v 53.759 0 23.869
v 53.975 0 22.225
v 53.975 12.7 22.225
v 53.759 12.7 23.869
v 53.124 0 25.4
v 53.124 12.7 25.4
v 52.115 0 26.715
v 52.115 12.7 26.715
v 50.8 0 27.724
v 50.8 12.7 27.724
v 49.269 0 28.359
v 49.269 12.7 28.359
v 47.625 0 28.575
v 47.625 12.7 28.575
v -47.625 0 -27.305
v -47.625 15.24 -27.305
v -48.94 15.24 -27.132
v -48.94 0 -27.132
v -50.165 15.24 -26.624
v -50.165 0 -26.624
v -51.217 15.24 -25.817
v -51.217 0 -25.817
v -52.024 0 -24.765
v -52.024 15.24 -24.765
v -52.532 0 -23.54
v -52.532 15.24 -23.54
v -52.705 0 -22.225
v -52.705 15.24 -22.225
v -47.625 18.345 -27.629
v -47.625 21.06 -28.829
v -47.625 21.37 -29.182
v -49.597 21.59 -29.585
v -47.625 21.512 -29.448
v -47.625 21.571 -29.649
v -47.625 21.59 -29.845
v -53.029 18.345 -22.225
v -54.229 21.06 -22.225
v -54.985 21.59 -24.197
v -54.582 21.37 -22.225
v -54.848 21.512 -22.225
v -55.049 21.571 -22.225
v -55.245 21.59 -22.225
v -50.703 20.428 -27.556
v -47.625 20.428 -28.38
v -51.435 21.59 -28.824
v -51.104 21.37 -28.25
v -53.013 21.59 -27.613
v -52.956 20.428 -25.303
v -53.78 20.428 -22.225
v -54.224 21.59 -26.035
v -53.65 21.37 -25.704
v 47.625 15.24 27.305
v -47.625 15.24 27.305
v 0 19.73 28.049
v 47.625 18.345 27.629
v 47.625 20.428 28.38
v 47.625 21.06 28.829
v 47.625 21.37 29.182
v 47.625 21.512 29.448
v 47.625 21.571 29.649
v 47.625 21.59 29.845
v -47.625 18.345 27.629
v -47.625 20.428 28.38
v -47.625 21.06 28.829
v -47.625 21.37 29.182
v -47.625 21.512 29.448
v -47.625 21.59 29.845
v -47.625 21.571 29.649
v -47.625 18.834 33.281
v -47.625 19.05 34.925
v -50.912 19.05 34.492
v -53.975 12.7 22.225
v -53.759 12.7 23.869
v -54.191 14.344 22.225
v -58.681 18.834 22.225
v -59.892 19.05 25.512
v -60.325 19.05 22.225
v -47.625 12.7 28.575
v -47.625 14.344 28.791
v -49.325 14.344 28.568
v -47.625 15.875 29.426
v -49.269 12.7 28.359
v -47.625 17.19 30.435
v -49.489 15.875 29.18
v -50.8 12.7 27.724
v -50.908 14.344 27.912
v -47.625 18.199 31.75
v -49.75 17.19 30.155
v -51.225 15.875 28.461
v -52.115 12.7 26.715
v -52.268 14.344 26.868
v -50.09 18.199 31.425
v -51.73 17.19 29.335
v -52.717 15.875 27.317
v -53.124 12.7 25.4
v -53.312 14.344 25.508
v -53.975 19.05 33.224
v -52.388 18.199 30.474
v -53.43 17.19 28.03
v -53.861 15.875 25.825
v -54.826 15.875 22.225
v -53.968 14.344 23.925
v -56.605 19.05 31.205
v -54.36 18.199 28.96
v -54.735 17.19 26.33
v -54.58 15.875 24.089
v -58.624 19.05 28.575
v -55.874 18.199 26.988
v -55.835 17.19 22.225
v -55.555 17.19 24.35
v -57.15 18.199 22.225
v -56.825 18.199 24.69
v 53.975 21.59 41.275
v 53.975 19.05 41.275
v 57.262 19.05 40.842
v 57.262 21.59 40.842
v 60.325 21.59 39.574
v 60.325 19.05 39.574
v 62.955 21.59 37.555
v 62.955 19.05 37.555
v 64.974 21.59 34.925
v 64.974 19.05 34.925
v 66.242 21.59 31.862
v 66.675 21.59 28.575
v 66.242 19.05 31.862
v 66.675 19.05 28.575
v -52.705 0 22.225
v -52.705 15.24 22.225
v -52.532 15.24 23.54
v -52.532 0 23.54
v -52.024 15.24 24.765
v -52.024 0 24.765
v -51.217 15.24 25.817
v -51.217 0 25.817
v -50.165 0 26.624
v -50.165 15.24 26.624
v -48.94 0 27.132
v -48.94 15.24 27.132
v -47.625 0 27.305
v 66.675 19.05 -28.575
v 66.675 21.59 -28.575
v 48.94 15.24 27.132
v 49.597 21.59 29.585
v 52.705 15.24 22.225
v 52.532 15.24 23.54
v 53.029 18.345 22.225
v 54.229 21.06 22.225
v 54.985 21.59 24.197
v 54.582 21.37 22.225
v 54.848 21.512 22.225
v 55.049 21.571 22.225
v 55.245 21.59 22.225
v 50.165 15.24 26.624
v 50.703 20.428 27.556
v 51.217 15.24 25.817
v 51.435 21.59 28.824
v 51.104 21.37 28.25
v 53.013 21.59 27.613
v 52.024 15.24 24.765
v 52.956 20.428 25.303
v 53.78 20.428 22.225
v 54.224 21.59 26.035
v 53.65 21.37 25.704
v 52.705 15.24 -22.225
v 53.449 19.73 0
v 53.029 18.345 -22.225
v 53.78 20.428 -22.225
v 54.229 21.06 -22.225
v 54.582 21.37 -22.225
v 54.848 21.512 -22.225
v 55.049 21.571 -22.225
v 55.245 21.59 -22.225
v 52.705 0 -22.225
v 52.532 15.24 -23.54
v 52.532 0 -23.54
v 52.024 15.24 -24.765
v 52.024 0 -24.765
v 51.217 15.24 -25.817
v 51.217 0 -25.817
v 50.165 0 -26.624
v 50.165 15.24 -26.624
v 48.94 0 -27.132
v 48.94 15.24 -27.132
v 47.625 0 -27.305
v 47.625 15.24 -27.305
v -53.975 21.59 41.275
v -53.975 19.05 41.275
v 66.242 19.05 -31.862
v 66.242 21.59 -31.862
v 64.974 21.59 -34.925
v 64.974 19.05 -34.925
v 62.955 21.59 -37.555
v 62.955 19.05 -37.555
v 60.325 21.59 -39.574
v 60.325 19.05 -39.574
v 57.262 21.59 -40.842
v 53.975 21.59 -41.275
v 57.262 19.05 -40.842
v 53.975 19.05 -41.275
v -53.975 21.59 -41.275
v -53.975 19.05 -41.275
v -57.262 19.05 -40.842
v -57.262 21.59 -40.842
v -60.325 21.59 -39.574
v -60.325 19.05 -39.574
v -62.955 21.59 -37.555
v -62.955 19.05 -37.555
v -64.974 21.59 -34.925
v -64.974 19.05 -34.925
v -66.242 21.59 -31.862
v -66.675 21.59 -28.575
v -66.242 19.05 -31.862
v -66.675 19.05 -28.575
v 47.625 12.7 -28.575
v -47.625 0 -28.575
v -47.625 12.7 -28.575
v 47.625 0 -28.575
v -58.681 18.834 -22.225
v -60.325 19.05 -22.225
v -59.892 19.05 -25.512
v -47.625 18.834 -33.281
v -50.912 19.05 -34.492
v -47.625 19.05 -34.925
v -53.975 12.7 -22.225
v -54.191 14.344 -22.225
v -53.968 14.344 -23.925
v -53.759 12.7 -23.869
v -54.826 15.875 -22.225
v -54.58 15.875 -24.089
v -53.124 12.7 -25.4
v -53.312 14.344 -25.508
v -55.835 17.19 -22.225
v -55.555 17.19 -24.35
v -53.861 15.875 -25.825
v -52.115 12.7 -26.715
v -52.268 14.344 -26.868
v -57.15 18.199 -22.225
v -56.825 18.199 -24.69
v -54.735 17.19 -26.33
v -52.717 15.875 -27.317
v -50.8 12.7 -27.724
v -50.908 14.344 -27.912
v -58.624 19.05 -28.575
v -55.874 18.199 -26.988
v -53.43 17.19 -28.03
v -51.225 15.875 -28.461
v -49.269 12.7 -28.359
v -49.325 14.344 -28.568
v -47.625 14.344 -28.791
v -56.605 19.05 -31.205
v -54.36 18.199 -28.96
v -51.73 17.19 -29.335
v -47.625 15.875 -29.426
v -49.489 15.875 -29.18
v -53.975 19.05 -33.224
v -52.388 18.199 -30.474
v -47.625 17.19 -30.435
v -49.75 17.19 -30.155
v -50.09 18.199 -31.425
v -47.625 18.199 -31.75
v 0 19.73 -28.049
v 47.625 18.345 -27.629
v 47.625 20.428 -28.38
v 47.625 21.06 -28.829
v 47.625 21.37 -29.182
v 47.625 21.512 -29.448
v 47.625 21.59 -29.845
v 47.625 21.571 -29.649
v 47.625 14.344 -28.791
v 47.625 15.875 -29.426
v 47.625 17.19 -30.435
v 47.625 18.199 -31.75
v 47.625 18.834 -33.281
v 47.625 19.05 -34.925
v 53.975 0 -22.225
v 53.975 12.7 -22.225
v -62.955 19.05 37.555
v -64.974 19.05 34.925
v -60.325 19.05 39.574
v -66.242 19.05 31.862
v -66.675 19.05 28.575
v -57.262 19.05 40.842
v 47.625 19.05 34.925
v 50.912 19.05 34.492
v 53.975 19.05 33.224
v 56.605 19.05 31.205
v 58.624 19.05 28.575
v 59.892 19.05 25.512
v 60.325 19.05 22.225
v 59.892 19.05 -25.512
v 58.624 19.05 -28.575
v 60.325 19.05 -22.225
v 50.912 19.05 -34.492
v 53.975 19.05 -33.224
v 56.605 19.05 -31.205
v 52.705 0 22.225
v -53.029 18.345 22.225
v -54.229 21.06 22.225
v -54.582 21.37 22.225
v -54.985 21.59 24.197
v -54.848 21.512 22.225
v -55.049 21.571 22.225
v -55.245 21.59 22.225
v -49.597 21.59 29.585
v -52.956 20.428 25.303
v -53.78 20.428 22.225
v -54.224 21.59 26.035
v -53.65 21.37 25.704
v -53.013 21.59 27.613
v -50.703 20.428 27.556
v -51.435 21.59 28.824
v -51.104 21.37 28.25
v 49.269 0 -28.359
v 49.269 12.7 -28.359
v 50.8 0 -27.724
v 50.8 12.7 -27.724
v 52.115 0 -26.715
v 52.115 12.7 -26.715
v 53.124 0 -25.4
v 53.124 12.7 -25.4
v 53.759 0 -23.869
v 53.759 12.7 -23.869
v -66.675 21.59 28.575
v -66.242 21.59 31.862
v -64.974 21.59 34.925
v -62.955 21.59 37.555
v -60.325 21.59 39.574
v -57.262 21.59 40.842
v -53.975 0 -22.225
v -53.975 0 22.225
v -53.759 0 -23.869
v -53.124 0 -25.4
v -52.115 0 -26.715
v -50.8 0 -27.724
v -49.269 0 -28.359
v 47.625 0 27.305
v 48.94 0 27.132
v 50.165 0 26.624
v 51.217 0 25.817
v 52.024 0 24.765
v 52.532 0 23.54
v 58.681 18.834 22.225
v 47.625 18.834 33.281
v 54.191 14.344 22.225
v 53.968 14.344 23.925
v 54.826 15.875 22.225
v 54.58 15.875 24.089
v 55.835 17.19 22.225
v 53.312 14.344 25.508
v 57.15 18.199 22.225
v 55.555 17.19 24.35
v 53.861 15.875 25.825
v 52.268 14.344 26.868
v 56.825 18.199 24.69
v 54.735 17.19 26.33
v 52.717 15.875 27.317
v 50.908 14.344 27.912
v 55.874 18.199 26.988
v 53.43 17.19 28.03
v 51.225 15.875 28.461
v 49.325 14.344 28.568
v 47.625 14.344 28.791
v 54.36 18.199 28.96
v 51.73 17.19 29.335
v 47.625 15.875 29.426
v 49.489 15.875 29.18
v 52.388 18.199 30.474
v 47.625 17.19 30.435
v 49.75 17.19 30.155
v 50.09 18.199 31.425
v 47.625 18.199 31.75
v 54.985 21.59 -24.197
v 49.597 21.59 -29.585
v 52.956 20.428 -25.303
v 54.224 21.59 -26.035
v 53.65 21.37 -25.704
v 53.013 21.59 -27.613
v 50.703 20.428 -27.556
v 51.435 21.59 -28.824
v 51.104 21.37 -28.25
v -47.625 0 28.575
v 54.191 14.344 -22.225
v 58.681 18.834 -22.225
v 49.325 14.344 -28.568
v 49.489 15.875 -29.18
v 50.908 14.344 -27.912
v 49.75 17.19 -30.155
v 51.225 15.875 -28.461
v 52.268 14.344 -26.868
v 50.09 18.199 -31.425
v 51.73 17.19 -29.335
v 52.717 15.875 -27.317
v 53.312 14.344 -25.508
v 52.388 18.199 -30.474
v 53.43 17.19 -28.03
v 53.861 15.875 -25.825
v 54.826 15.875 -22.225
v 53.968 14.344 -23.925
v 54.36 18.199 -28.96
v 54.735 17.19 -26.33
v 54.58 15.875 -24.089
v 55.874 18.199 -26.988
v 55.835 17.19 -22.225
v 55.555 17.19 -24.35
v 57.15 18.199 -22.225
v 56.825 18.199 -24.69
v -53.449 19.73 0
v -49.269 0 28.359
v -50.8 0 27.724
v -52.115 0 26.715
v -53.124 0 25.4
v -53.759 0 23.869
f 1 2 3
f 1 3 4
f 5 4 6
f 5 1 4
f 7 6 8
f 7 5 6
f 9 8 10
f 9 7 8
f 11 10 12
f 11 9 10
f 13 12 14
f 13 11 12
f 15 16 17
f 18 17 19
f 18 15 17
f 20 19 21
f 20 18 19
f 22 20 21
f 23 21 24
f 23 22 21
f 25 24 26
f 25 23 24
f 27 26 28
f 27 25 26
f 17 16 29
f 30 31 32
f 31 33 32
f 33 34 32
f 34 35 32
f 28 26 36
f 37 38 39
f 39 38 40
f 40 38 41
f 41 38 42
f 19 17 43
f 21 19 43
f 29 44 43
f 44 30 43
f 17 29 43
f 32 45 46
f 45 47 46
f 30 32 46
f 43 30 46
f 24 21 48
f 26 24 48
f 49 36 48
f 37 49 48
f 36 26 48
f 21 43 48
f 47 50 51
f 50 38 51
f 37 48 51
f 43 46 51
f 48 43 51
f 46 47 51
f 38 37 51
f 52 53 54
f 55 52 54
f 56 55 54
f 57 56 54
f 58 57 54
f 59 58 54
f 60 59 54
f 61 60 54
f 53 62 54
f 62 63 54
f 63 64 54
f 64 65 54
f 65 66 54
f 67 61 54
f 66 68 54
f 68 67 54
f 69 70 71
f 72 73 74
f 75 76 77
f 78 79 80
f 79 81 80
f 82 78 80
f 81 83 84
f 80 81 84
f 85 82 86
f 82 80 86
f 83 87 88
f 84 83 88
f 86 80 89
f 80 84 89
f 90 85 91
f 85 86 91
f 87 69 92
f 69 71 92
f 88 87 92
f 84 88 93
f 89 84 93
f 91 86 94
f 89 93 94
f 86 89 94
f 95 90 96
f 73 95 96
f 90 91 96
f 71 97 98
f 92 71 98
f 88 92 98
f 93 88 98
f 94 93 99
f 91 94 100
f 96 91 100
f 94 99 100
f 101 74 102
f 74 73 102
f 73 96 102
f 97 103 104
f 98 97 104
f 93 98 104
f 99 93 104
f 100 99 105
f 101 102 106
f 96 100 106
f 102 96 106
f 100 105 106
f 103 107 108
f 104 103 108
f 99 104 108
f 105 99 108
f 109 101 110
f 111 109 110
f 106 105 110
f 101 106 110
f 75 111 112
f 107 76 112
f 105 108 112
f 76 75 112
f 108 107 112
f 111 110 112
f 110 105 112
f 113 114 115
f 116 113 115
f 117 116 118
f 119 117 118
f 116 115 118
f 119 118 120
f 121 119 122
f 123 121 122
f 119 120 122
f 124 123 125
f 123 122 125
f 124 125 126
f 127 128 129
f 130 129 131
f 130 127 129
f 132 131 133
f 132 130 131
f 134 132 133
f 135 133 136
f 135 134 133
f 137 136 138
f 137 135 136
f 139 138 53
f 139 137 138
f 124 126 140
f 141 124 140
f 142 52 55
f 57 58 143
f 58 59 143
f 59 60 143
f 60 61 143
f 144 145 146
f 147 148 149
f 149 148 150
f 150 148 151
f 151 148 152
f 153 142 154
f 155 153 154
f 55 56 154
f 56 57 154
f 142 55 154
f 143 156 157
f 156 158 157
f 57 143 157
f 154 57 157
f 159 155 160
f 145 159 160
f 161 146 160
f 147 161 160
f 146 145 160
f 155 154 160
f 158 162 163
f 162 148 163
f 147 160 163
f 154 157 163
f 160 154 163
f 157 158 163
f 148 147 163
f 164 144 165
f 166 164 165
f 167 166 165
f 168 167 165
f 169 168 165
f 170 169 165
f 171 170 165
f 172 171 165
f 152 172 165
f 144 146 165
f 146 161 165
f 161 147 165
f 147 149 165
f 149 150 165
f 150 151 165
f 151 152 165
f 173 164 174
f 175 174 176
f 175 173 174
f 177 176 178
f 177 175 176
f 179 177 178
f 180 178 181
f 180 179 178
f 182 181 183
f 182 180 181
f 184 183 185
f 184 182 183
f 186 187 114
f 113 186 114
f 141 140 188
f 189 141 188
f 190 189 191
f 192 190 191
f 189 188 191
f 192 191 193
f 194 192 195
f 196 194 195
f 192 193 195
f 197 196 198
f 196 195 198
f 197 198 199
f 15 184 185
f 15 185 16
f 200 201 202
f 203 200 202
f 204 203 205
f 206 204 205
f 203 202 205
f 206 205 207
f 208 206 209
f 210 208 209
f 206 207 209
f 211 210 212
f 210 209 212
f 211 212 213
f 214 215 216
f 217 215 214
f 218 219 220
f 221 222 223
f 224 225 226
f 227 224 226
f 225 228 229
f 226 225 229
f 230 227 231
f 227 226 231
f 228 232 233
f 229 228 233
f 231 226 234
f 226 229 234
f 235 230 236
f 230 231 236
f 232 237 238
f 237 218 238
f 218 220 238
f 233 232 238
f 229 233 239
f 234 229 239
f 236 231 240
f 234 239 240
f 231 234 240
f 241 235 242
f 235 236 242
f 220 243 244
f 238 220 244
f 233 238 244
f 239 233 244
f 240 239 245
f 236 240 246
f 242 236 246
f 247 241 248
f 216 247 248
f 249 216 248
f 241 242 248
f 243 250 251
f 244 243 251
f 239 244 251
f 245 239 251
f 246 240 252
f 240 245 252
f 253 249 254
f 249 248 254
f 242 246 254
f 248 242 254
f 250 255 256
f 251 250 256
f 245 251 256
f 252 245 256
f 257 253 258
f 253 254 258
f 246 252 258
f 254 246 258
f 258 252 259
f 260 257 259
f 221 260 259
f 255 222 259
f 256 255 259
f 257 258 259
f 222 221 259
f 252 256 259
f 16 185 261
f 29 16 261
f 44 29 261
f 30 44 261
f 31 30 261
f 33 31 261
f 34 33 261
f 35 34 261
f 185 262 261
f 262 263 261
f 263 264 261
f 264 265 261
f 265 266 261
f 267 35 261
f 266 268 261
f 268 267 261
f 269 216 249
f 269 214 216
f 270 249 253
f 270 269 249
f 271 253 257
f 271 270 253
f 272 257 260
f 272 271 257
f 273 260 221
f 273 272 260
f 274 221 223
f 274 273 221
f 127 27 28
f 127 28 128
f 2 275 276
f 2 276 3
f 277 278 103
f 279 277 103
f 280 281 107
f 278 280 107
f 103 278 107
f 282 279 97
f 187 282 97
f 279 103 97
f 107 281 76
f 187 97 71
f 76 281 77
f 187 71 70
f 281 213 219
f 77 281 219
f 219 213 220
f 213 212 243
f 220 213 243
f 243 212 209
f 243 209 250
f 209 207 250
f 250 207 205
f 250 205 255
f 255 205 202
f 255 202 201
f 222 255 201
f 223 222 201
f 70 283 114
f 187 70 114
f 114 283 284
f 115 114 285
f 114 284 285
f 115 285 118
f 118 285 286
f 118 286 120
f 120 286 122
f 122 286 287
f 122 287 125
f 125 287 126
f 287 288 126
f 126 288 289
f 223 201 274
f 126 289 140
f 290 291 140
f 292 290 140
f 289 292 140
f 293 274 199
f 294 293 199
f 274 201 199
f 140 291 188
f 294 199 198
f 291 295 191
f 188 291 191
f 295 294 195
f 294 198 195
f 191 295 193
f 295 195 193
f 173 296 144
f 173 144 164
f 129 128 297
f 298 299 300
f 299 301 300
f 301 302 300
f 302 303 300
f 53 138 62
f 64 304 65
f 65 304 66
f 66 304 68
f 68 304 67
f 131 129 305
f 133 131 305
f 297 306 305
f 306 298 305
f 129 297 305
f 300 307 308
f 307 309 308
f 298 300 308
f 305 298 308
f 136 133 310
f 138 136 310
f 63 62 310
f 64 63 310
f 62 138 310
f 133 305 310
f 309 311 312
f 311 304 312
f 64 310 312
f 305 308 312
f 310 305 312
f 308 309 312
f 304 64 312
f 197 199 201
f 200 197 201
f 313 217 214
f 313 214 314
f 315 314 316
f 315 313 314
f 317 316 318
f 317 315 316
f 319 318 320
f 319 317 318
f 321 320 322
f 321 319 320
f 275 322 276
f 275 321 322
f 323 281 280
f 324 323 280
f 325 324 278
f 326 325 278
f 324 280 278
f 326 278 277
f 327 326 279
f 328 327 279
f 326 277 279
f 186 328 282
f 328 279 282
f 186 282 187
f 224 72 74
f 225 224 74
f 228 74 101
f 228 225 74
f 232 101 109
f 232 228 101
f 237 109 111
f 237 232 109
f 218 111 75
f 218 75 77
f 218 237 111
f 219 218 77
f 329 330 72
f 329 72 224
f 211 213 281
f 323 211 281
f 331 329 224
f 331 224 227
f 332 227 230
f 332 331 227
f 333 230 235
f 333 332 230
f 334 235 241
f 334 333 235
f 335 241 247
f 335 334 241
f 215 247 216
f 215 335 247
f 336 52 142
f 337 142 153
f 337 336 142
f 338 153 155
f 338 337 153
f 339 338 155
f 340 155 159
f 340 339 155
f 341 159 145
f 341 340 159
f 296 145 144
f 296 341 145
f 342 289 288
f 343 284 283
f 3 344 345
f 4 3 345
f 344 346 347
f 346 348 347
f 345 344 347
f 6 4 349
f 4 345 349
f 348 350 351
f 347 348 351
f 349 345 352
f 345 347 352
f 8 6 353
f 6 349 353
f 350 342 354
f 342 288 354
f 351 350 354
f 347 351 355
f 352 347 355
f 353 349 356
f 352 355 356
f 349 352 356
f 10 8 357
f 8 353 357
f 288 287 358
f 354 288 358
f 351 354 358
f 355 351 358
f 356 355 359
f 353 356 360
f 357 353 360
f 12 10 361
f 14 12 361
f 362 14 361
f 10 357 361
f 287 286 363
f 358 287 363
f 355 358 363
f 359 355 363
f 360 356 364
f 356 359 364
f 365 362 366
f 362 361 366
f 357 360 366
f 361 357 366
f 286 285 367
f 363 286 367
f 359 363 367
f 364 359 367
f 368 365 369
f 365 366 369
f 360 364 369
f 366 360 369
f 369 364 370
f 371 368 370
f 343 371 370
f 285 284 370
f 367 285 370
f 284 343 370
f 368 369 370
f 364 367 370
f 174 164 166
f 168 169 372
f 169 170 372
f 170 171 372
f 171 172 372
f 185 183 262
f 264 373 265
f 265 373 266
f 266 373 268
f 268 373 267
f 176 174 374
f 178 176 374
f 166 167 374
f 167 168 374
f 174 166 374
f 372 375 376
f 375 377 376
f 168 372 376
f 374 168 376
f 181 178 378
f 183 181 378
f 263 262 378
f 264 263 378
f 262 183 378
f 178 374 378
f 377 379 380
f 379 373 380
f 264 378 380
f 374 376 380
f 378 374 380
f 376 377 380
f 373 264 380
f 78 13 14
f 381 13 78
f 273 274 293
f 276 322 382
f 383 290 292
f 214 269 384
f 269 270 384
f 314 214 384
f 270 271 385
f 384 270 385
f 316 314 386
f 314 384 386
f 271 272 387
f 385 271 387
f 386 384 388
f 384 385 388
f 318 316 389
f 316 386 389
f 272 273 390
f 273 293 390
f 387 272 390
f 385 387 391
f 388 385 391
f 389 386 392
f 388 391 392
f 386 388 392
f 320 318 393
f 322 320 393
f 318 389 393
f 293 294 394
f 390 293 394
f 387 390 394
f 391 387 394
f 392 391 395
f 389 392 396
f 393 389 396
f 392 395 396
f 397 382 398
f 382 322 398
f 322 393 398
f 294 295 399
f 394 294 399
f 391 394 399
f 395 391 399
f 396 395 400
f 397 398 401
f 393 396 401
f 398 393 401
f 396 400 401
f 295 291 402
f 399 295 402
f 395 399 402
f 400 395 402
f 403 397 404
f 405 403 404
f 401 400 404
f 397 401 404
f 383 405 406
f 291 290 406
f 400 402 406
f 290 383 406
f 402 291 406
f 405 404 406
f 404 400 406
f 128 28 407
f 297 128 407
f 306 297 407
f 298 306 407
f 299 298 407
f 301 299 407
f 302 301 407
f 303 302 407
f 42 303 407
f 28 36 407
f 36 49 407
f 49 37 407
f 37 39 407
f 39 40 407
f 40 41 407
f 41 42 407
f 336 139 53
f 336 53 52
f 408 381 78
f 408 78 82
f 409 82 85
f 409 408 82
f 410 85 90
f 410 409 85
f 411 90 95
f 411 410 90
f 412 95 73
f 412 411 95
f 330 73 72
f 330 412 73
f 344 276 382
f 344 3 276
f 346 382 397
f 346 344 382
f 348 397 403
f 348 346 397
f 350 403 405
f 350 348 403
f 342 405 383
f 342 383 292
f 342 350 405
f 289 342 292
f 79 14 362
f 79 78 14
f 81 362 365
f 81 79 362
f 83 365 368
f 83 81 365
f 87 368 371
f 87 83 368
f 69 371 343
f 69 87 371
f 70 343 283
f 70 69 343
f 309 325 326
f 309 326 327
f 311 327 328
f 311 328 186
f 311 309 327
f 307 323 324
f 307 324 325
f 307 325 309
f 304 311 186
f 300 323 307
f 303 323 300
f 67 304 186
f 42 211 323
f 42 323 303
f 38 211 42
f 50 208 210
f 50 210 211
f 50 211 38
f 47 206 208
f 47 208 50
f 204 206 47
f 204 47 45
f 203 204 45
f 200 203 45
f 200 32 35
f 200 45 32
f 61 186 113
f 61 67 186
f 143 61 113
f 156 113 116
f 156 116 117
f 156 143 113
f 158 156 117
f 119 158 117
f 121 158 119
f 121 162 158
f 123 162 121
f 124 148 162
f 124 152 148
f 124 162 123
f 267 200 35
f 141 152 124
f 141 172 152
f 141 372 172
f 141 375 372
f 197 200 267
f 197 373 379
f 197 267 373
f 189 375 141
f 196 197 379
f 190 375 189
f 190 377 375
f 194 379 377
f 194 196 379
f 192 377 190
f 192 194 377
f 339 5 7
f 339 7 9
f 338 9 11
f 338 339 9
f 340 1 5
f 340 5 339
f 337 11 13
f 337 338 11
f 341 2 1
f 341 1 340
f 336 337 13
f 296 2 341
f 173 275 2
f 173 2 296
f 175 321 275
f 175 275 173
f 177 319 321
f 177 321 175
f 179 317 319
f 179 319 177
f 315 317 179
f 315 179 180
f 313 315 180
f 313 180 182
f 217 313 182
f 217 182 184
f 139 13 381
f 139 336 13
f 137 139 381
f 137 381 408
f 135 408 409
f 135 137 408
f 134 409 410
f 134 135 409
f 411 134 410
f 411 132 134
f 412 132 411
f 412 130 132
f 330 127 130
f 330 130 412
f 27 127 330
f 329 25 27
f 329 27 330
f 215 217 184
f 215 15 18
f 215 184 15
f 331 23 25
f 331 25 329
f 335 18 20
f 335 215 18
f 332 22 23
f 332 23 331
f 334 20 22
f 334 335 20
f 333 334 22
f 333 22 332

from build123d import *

# Parameters (mm, degrees)
BOSS_EXTRUDE1_DEPTH = 19.05
BOSS_EXTRUDE2_DEPTH = 2.54
FILLET1_R           = 6.35
FILLET3_SIZE        = 6.35
FILLET3_SIZE_2      = 2.54


with BuildPart() as part:
    # Sketch1 → Boss-Extrude1 (new body)
    with BuildSketch(Plane(origin=(0, 0, 0), x_dir=(1, 0, 0), z_dir=(0, 1, 0))):
        with BuildLine():
            Line((-47.625, 28.575), (47.625, 28.575))
            ThreePointArc((47.625, 28.575), (52.115128061, 26.715128061), (53.975, 22.225))
            Line((53.975, 22.225), (53.975, -22.225))
            ThreePointArc((53.975, -22.225), (52.115128061, -26.715128061), (47.625, -28.575))
            Line((47.625, -28.575), (-47.625, -28.575))
            ThreePointArc((-47.625, -28.575), (-52.115128061, -26.715128061), (-53.975, -22.225))
            Line((-53.975, -22.225), (-53.975, 22.225))
            ThreePointArc((-53.975, 22.225), (-52.115128061, 26.715128061), (-47.625, 28.575))
        make_face()
        with BuildLine():
            Line((-52.705, 22.225), (-52.705, -22.225))
            ThreePointArc((-52.705, -22.225), (-51.217102448, -25.817102448), (-47.625, -27.305))
            Line((-47.625, -27.305), (47.625, -27.305))
            ThreePointArc((47.625, -27.305), (51.217102448, -25.817102448), (52.705, -22.225))
            Line((52.705, -22.225), (52.705, 22.225))
            ThreePointArc((52.705, 22.225), (51.217102448, 25.817102448), (47.625, 27.305))
            Line((47.625, 27.305), (-47.625, 27.305))
            ThreePointArc((-47.625, 27.305), (-51.217102448, 25.817102448), (-52.705, 22.225))
        make_face(mode=Mode.SUBTRACT)
    extrude(amount=BOSS_EXTRUDE1_DEPTH)

    # Sketch2 → Boss-Extrude2 (add)
    with BuildSketch(Plane(origin=(0, 19.05, 0), x_dir=(1, 0, 0), z_dir=(0, 1, 0))):
        with BuildLine():
            Line((-53.975, -41.275), (53.975, -41.275))
            ThreePointArc((53.975, -41.275), (62.955256121, -37.555256121), (66.675, -28.575))
            Line((66.675, -28.575), (66.675, 28.575))
            ThreePointArc((66.675, 28.575), (62.955256121, 37.555256121), (53.975, 41.275))
            Line((53.975, 41.275), (-53.975, 41.275))
            ThreePointArc((-53.975, 41.275), (-62.955256121, 37.555256121), (-66.675, 28.575))
            Line((-66.675, 28.575), (-66.675, -28.575))
            ThreePointArc((-66.675, -28.575), (-62.955256121, -37.555256121), (-53.975, -41.275))
        make_face()
        with BuildLine():
            Line((52.705, -22.225), (52.705, 22.225))
            ThreePointArc((52.705, 22.225), (51.217102448, 25.817102448), (47.625, 27.305))
            Line((47.625, 27.305), (-47.625, 27.305))
            ThreePointArc((-47.625, 27.305), (-51.217102448, 25.817102448), (-52.705, 22.225))
            Line((-52.705, 22.225), (-52.705, -22.225))
            ThreePointArc((-52.705, -22.225), (-51.217102448, -25.817102448), (-47.625, -27.305))
            Line((-47.625, -27.305), (47.625, -27.305))
            ThreePointArc((47.625, -27.305), (51.217102448, -25.817102448), (52.705, -22.225))
        make_face(mode=Mode.SUBTRACT)
    extrude(amount=BOSS_EXTRUDE2_DEPTH)

    # Fillet1
    fillet1_edges = [part.edges().sort_by_distance(p)[0] for p in [
        (-52.115128061, 19.05, -26.715128061),
        (-53.975, 19.05, 0),
        (-52.115128061, 19.05, 26.715128061),
        (0, 19.05, 28.575),
        (52.115128061, 19.05, 26.715128061),
        (53.975, 19.05, 0),
        (52.115128061, 19.05, -26.715128061),
        (0, 19.05, -28.575),
    ]]
    fillet(fillet1_edges, radius=FILLET1_R)

    # Fillet3
    # an asymmetric fillet: 6.35, 2.54 mm, written as the material it takes off along each edge
    with BuildSketch(Plane(origin=(47.625, 21.59, -22.225), x_dir=(1, 0, 0), z_dir=(0, 0, 1))) as fillet3_piece_1:
        with BuildLine():
            Bezier((5.08, -FILLET3_SIZE), (5.08, 0), (5.08 + FILLET3_SIZE_2, 0), weights=[1, 0.707106781, 1])
            Line((5.08 + FILLET3_SIZE_2, 0), (5.08, 0))
            Line((5.08, 0), (5.08, -FILLET3_SIZE))
        make_face()
    revolve(axis=Axis((47.625, 21.59, -22.225), (0, 1, 0)), revolution_arc=90, mode=Mode.SUBTRACT)
    with BuildSketch(Plane(origin=(52.705, 21.59, 22.225), x_dir=(0, -1, 0), z_dir=(0, 0, -1)), Plane(origin=(-52.705, 21.59, -22.225), x_dir=(0, -1, 0), z_dir=(0, 0, 1))) as fillet3_piece_2:
        with BuildLine():
            Bezier((FILLET3_SIZE, 0), (0, 0), (0, -FILLET3_SIZE_2), weights=[1, 0.707106781, 1])
            Line((0, -FILLET3_SIZE_2), (0, 0))
            Line((0, 0), (FILLET3_SIZE, 0))
        make_face()
    extrude(amount=44.45, mode=Mode.SUBTRACT)
    with BuildSketch(Plane(origin=(47.625, 21.59, 22.225), x_dir=(0, 0, 1), z_dir=(-1, 0, 0))) as fillet3_piece_3:
        with BuildLine():
            Bezier((5.08, -FILLET3_SIZE), (5.08, 0), (5.08 + FILLET3_SIZE_2, 0), weights=[1, 0.707106781, 1])
            Line((5.08 + FILLET3_SIZE_2, 0), (5.08, 0))
            Line((5.08, 0), (5.08, -FILLET3_SIZE))
        make_face()
    revolve(axis=Axis((47.625, 21.59, 22.225), (0, 1, 0)), revolution_arc=90, mode=Mode.SUBTRACT)
    with BuildSketch(Plane(origin=(-47.625, 21.59, 27.305), x_dir=(0, -1, 0), z_dir=(1, 0, 0)), Plane(origin=(47.625, 21.59, -27.305), x_dir=(0, -1, 0), z_dir=(-1, 0, 0))) as fillet3_piece_4:
        with BuildLine():
            Bezier((FILLET3_SIZE, 0), (0, 0), (0, -FILLET3_SIZE_2), weights=[1, 0.707106781, 1])
            Line((0, -FILLET3_SIZE_2), (0, 0))
            Line((0, 0), (FILLET3_SIZE, 0))
        make_face()
    extrude(amount=95.25, mode=Mode.SUBTRACT)
    with BuildSketch(Plane(origin=(-47.625, 21.59, 22.225), x_dir=(-1, 0, 0), z_dir=(0, 0, -1))) as fillet3_piece_5:
        with BuildLine():
            Bezier((5.08, -FILLET3_SIZE), (5.08, 0), (5.08 + FILLET3_SIZE_2, 0), weights=[1, 0.707106781, 1])
            Line((5.08 + FILLET3_SIZE_2, 0), (5.08, 0))
            Line((5.08, 0), (5.08, -FILLET3_SIZE))
        make_face()
    revolve(axis=Axis((-47.625, 21.59, 22.225), (0, 1, 0)), revolution_arc=90, mode=Mode.SUBTRACT)
    with BuildSketch(Plane(origin=(-47.625, 21.59, -22.225), x_dir=(0, 0, -1), z_dir=(1, 0, 0))) as fillet3_piece_6:
        with BuildLine():
            Bezier((5.08, -FILLET3_SIZE), (5.08, 0), (5.08 + FILLET3_SIZE_2, 0), weights=[1, 0.707106781, 1])
            Line((5.08 + FILLET3_SIZE_2, 0), (5.08, 0))
            Line((5.08, 0), (5.08, -FILLET3_SIZE))
        make_face()
    revolve(axis=Axis((-47.625, 21.59, -22.225), (0, 1, 0)), revolution_arc=90, mode=Mode.SUBTRACT)


solid = part.part
